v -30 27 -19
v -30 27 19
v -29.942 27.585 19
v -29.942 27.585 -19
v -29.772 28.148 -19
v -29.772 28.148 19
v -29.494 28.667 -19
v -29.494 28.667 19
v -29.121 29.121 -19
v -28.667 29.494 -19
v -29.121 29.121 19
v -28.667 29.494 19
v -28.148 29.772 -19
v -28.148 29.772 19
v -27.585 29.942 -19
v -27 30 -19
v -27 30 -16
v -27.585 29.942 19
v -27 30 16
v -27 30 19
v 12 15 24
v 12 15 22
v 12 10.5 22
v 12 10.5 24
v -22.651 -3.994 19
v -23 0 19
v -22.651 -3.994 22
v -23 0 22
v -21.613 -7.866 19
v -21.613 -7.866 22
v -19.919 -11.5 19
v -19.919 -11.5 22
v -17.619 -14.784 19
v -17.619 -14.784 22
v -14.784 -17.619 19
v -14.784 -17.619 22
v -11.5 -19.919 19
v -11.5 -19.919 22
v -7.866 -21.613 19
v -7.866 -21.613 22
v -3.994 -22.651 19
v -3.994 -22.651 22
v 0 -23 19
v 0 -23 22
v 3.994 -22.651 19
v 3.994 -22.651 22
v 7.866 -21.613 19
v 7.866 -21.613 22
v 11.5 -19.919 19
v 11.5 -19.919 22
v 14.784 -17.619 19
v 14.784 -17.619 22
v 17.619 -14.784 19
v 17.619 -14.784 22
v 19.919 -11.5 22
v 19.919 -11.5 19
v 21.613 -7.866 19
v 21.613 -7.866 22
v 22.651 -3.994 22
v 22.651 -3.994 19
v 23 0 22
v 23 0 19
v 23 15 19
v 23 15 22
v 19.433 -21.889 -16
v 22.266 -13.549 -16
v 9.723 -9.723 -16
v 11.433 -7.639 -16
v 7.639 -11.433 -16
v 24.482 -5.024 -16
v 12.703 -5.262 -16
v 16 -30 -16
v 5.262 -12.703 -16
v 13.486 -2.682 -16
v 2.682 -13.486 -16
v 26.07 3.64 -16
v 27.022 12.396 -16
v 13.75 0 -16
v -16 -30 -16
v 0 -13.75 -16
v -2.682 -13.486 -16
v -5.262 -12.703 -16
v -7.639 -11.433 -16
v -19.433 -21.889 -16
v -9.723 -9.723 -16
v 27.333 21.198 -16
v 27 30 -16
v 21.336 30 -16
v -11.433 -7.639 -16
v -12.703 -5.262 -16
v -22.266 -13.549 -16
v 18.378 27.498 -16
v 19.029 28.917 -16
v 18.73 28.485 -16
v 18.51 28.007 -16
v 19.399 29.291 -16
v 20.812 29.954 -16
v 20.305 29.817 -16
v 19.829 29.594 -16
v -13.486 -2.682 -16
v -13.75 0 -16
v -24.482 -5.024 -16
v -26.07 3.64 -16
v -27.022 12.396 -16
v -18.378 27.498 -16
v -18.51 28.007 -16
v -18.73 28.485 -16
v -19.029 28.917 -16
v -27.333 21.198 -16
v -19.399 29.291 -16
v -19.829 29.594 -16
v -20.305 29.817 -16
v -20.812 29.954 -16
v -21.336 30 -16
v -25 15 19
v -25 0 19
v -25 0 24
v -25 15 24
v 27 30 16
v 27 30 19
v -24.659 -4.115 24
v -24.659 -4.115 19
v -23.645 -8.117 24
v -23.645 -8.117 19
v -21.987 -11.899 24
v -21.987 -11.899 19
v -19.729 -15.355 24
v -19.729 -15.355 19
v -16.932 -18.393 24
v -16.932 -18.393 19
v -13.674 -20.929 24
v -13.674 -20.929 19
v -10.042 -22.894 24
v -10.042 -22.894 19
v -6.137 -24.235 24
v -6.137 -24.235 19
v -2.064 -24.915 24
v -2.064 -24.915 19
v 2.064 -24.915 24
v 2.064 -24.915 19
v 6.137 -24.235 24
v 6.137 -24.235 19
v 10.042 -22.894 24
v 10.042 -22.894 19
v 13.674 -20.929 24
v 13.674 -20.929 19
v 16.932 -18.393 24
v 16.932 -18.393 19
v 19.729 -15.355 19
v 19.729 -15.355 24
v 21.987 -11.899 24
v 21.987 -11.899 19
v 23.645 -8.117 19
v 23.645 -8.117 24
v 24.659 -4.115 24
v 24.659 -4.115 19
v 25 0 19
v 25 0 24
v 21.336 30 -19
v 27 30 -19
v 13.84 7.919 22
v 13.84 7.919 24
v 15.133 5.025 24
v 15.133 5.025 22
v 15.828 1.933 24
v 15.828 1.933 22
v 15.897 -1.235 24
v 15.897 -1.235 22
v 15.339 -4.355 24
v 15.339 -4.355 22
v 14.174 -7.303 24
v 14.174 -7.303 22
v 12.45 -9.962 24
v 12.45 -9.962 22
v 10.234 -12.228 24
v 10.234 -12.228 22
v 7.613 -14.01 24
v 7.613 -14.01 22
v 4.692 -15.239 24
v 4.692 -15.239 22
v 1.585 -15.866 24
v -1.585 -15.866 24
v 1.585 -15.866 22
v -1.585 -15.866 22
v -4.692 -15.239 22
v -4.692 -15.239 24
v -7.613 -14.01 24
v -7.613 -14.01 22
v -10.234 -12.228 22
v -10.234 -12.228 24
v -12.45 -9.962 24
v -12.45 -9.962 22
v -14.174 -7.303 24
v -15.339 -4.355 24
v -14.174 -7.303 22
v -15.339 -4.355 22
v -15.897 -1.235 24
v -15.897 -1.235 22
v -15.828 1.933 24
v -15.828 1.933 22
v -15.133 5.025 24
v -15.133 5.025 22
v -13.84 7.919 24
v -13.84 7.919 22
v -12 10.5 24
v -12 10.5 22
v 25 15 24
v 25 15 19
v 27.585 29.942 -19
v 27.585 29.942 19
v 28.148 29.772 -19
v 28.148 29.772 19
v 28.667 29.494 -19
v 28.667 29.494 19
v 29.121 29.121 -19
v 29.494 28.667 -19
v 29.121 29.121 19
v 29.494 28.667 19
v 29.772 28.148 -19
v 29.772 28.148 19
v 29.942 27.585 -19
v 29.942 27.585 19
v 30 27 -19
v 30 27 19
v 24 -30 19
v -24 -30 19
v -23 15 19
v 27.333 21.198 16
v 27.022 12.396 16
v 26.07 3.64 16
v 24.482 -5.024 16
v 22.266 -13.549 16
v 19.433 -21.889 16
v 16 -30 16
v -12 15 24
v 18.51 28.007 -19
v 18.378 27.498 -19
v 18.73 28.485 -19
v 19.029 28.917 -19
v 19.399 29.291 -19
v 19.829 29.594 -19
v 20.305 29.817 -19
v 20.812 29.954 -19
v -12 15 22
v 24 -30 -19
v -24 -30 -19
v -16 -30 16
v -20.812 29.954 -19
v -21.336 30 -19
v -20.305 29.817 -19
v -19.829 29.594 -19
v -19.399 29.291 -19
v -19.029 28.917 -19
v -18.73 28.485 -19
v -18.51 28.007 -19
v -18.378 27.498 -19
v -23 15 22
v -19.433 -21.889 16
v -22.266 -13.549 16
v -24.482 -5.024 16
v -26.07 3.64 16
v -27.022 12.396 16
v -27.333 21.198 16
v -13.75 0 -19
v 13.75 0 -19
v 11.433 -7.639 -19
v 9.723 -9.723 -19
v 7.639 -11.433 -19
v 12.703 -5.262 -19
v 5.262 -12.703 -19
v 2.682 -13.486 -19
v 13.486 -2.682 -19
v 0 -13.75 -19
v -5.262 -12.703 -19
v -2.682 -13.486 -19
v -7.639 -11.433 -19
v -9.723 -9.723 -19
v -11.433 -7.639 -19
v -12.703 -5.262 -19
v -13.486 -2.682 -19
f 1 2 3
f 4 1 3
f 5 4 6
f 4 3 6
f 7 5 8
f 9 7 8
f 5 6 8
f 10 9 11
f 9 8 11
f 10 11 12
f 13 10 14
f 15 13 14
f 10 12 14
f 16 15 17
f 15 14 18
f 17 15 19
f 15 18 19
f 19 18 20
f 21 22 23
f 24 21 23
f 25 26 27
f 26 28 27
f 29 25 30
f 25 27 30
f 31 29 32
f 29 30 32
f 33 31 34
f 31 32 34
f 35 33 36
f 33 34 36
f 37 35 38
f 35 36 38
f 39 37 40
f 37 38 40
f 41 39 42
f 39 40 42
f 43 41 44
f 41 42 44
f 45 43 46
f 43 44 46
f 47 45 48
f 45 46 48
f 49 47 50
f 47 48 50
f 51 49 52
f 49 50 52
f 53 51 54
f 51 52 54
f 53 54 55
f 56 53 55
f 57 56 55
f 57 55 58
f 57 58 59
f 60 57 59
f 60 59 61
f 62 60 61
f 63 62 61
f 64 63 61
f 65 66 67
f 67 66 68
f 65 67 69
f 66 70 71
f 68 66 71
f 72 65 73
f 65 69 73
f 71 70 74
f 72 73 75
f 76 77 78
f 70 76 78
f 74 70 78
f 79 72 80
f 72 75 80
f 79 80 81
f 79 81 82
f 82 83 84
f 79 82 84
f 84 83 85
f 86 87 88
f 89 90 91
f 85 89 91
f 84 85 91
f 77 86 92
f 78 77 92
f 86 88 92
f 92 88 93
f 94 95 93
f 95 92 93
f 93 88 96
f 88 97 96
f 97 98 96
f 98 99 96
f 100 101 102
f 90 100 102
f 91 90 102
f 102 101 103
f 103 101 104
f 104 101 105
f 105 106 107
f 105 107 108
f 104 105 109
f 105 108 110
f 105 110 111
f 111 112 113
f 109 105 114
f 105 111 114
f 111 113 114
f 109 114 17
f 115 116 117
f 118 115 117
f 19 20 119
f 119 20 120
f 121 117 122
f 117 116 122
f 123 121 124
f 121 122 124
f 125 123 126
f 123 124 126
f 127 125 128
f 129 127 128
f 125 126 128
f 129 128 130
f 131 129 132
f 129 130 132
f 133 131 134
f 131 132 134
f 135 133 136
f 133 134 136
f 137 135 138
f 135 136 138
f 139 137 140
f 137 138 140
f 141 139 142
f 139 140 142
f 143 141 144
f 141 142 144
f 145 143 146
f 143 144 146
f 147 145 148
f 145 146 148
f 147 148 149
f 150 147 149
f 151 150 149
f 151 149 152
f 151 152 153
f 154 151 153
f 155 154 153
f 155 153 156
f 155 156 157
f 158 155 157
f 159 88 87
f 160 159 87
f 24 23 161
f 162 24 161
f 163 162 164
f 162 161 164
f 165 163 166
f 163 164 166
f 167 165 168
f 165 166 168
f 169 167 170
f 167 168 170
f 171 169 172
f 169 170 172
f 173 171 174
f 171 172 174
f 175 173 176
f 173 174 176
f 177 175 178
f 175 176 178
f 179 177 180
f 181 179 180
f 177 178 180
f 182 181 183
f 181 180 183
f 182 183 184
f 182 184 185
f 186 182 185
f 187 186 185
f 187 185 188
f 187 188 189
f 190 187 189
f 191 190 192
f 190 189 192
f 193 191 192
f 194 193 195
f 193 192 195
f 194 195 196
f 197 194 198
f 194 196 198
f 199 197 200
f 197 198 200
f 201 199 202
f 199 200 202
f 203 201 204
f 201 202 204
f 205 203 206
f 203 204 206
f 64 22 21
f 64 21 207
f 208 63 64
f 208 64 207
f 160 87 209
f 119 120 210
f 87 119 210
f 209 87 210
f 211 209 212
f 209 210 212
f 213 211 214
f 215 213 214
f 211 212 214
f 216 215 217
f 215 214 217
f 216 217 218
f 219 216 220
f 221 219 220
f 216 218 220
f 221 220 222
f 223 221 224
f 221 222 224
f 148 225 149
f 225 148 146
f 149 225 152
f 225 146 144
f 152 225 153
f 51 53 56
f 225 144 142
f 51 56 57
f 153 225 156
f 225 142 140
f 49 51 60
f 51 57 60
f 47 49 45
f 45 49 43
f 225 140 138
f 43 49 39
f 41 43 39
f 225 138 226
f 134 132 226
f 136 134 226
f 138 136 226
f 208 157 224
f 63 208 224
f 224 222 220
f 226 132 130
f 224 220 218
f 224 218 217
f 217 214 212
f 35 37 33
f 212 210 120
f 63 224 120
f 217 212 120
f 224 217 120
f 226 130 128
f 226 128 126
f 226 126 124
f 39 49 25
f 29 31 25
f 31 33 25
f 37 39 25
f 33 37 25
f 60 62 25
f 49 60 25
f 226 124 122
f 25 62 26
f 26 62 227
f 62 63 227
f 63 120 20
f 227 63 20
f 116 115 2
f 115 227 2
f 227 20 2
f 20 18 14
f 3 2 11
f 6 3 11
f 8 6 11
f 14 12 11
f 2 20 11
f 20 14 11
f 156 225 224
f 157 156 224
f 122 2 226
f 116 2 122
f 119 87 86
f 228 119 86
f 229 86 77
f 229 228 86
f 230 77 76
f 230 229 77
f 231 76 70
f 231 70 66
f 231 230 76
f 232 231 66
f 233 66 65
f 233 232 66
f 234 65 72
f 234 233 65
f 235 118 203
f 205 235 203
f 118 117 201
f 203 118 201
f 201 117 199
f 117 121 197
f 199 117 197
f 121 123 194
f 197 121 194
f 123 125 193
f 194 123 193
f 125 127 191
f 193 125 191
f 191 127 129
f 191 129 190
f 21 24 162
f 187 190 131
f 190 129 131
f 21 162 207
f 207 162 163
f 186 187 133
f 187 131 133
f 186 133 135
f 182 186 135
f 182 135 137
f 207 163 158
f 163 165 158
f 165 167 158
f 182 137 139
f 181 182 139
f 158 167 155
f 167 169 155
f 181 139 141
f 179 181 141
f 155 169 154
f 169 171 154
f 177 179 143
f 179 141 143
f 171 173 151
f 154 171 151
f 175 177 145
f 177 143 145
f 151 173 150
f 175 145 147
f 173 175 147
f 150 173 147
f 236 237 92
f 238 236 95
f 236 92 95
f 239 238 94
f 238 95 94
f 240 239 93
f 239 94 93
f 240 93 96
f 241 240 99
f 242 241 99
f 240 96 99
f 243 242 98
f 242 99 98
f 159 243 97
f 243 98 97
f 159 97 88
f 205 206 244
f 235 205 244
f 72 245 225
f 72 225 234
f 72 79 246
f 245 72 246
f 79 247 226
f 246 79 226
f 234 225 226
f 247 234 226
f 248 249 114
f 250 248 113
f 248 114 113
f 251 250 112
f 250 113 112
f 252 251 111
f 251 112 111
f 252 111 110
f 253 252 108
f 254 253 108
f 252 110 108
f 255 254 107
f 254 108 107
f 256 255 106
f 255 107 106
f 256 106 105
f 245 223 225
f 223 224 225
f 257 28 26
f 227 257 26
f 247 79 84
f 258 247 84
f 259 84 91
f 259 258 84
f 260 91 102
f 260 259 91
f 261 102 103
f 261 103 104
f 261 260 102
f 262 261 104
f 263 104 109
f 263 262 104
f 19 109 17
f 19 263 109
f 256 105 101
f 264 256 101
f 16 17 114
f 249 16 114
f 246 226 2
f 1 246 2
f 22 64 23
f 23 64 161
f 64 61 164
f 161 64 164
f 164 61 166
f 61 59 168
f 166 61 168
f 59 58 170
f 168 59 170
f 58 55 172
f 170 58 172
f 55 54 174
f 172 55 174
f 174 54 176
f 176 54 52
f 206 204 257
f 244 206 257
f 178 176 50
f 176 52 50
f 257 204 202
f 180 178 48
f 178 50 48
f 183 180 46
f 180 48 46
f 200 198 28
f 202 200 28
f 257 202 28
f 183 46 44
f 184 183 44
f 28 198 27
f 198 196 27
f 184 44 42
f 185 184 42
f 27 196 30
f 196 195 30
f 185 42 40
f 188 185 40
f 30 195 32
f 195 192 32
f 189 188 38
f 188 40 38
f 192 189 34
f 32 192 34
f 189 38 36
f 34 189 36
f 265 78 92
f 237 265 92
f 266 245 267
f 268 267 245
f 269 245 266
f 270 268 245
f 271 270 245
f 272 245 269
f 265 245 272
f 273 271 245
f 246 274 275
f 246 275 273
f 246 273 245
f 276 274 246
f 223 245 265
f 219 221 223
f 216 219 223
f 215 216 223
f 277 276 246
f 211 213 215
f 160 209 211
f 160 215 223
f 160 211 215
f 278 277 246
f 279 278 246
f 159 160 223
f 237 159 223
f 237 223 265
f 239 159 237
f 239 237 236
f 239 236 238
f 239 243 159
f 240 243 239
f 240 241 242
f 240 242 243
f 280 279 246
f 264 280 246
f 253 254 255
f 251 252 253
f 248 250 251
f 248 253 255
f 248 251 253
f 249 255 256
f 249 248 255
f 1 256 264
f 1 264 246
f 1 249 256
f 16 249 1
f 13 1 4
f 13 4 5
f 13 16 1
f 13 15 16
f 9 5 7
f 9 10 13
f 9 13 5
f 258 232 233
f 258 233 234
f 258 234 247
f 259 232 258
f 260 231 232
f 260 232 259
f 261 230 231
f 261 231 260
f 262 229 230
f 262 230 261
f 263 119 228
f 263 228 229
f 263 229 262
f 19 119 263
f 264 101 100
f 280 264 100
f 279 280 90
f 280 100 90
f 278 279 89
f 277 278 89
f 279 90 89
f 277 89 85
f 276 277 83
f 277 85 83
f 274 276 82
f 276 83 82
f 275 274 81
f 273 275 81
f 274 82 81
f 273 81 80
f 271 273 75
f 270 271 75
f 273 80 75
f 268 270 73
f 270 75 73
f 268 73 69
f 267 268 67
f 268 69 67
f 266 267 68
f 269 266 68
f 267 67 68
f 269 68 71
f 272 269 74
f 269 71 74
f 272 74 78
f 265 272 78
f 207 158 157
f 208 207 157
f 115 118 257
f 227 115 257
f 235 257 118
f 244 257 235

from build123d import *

# Parameters (mm, degrees)
SALIENTE_EXTRUIR5_DEPTH  = 19
CORTAR_EXTRUIR8_DEPTH    = 16
SALIENTE_EXTRUIR8_DEPTH  = 3
REVOLUCI_N7_ANGLE        = 180
SALIENTE_EXTRUIR10_DEPTH = 15
CORTAR_EXTRUIR7_START    = 22
CORTAR_EXTRUIR7_DEPTH    = 2


with BuildPart() as part:
    # Croquis1 → Saliente-Extruir5 (new body, symmetric)
    with BuildSketch(Plane.XY):
        with BuildLine():
            Line((-27, 30), (-21.336320434, 30))
            ThreePointArc((-21.336320434, 30), (-19.399015955, 29.290600654), (-18.377926496, 27.497900903))
            Line((-18.377926496, 27.497900903), (-13.75, 0))
            ThreePointArc((-13.75, 0), (0, -13.75), (13.75, 0))
            Line((13.75, 0), (18.377926496, 27.497900903))
            ThreePointArc((18.377926496, 27.497900903), (19.399015955, 29.290600654), (21.336320434, 30))
            Line((21.336320434, 30), (27, 30))
            ThreePointArc((27, 30), (29.121320344, 29.121320344), (30, 27))
            Line((30, 27), (24, -30))
            Line((24, -30), (-24, -30))
            Line((-24, -30), (-30, 27))
            ThreePointArc((-30, 27), (-29.121320344, 29.121320344), (-27, 30))
        make_face()
    extrude(amount=SALIENTE_EXTRUIR5_DEPTH, both=True)

    # Croquis22 → Cortar-Extruir8 (cut, symmetric)
    with BuildSketch(Plane.XY):
        with BuildLine():
            Line((16, -30), (-16, -30))
            ThreePointArc((-16, -30), (-25.355108055, -0.70676981), (-27, 30))
            Line((-27, 30), (-18, 30))
            Line((-18, 30), (-13.75, 0))
            ThreePointArc((-13.75, 0), (0, -13.75), (13.75, 0))
            Line((13.75, 0), (18, 30))
            Line((18, 30), (27, 30))
            ThreePointArc((27, 30), (25.355108055, -0.70676981), (16, -30))
        make_face()
    extrude(amount=CORTAR_EXTRUIR8_DEPTH, both=True, mode=Mode.SUBTRACT)

    # Croquis8 → Saliente-Extruir8 (add)
    with BuildSketch(Plane.XY.offset(19)):
        Polygon((-21.336320434, 30), (21.336320434, 30), (21.336320434, -14), (0, -13.75), (-21.336320434, -14), align=None)
    extrude(amount=-SALIENTE_EXTRUIR8_DEPTH)

    # Croquis16 → Revolución7 (revolve)
    with BuildSketch(Plane(origin=(0, 0, 0), x_dir=(1, 0, 0), z_dir=(0, 1, 0))):
        Polygon((0, -22), (0, -24), (-25, -24), (-25, -19), (-23, -19), (-23, -22), align=None)
    revolve(axis=Axis((0, 0, 22), (0, 0, 1)), revolution_arc=REVOLUCI_N7_ANGLE)

    # Croquis18 → Saliente-Extruir10 (add)
    with BuildSketch(Plane(origin=(0, 0, 0), x_dir=(1, 0, 0), z_dir=(0, 1, 0))):
        Polygon((-25, -24), (25, -24), (25, -19), (23, -19), (23, -22), (-23, -22), (-23, -19), (-25, -19), align=None)
    extrude(amount=SALIENTE_EXTRUIR10_DEPTH)

    # Croquis19 → Cortar-Extruir7 (cut)
    with BuildSketch(Plane.XY.offset(CORTAR_EXTRUIR7_START)):
        with BuildLine():
            Line((-12, 10.5), (-12, 15))
            Line((-12, 15), (12, 15))
            Line((12, 15), (12, 10.5))
            ThreePointArc((12, 10.5), (0, -15.945218719), (-12, 10.5))
        make_face()
    extrude(amount=CORTAR_EXTRUIR7_DEPTH, mode=Mode.SUBTRACT)


solid = part.part
